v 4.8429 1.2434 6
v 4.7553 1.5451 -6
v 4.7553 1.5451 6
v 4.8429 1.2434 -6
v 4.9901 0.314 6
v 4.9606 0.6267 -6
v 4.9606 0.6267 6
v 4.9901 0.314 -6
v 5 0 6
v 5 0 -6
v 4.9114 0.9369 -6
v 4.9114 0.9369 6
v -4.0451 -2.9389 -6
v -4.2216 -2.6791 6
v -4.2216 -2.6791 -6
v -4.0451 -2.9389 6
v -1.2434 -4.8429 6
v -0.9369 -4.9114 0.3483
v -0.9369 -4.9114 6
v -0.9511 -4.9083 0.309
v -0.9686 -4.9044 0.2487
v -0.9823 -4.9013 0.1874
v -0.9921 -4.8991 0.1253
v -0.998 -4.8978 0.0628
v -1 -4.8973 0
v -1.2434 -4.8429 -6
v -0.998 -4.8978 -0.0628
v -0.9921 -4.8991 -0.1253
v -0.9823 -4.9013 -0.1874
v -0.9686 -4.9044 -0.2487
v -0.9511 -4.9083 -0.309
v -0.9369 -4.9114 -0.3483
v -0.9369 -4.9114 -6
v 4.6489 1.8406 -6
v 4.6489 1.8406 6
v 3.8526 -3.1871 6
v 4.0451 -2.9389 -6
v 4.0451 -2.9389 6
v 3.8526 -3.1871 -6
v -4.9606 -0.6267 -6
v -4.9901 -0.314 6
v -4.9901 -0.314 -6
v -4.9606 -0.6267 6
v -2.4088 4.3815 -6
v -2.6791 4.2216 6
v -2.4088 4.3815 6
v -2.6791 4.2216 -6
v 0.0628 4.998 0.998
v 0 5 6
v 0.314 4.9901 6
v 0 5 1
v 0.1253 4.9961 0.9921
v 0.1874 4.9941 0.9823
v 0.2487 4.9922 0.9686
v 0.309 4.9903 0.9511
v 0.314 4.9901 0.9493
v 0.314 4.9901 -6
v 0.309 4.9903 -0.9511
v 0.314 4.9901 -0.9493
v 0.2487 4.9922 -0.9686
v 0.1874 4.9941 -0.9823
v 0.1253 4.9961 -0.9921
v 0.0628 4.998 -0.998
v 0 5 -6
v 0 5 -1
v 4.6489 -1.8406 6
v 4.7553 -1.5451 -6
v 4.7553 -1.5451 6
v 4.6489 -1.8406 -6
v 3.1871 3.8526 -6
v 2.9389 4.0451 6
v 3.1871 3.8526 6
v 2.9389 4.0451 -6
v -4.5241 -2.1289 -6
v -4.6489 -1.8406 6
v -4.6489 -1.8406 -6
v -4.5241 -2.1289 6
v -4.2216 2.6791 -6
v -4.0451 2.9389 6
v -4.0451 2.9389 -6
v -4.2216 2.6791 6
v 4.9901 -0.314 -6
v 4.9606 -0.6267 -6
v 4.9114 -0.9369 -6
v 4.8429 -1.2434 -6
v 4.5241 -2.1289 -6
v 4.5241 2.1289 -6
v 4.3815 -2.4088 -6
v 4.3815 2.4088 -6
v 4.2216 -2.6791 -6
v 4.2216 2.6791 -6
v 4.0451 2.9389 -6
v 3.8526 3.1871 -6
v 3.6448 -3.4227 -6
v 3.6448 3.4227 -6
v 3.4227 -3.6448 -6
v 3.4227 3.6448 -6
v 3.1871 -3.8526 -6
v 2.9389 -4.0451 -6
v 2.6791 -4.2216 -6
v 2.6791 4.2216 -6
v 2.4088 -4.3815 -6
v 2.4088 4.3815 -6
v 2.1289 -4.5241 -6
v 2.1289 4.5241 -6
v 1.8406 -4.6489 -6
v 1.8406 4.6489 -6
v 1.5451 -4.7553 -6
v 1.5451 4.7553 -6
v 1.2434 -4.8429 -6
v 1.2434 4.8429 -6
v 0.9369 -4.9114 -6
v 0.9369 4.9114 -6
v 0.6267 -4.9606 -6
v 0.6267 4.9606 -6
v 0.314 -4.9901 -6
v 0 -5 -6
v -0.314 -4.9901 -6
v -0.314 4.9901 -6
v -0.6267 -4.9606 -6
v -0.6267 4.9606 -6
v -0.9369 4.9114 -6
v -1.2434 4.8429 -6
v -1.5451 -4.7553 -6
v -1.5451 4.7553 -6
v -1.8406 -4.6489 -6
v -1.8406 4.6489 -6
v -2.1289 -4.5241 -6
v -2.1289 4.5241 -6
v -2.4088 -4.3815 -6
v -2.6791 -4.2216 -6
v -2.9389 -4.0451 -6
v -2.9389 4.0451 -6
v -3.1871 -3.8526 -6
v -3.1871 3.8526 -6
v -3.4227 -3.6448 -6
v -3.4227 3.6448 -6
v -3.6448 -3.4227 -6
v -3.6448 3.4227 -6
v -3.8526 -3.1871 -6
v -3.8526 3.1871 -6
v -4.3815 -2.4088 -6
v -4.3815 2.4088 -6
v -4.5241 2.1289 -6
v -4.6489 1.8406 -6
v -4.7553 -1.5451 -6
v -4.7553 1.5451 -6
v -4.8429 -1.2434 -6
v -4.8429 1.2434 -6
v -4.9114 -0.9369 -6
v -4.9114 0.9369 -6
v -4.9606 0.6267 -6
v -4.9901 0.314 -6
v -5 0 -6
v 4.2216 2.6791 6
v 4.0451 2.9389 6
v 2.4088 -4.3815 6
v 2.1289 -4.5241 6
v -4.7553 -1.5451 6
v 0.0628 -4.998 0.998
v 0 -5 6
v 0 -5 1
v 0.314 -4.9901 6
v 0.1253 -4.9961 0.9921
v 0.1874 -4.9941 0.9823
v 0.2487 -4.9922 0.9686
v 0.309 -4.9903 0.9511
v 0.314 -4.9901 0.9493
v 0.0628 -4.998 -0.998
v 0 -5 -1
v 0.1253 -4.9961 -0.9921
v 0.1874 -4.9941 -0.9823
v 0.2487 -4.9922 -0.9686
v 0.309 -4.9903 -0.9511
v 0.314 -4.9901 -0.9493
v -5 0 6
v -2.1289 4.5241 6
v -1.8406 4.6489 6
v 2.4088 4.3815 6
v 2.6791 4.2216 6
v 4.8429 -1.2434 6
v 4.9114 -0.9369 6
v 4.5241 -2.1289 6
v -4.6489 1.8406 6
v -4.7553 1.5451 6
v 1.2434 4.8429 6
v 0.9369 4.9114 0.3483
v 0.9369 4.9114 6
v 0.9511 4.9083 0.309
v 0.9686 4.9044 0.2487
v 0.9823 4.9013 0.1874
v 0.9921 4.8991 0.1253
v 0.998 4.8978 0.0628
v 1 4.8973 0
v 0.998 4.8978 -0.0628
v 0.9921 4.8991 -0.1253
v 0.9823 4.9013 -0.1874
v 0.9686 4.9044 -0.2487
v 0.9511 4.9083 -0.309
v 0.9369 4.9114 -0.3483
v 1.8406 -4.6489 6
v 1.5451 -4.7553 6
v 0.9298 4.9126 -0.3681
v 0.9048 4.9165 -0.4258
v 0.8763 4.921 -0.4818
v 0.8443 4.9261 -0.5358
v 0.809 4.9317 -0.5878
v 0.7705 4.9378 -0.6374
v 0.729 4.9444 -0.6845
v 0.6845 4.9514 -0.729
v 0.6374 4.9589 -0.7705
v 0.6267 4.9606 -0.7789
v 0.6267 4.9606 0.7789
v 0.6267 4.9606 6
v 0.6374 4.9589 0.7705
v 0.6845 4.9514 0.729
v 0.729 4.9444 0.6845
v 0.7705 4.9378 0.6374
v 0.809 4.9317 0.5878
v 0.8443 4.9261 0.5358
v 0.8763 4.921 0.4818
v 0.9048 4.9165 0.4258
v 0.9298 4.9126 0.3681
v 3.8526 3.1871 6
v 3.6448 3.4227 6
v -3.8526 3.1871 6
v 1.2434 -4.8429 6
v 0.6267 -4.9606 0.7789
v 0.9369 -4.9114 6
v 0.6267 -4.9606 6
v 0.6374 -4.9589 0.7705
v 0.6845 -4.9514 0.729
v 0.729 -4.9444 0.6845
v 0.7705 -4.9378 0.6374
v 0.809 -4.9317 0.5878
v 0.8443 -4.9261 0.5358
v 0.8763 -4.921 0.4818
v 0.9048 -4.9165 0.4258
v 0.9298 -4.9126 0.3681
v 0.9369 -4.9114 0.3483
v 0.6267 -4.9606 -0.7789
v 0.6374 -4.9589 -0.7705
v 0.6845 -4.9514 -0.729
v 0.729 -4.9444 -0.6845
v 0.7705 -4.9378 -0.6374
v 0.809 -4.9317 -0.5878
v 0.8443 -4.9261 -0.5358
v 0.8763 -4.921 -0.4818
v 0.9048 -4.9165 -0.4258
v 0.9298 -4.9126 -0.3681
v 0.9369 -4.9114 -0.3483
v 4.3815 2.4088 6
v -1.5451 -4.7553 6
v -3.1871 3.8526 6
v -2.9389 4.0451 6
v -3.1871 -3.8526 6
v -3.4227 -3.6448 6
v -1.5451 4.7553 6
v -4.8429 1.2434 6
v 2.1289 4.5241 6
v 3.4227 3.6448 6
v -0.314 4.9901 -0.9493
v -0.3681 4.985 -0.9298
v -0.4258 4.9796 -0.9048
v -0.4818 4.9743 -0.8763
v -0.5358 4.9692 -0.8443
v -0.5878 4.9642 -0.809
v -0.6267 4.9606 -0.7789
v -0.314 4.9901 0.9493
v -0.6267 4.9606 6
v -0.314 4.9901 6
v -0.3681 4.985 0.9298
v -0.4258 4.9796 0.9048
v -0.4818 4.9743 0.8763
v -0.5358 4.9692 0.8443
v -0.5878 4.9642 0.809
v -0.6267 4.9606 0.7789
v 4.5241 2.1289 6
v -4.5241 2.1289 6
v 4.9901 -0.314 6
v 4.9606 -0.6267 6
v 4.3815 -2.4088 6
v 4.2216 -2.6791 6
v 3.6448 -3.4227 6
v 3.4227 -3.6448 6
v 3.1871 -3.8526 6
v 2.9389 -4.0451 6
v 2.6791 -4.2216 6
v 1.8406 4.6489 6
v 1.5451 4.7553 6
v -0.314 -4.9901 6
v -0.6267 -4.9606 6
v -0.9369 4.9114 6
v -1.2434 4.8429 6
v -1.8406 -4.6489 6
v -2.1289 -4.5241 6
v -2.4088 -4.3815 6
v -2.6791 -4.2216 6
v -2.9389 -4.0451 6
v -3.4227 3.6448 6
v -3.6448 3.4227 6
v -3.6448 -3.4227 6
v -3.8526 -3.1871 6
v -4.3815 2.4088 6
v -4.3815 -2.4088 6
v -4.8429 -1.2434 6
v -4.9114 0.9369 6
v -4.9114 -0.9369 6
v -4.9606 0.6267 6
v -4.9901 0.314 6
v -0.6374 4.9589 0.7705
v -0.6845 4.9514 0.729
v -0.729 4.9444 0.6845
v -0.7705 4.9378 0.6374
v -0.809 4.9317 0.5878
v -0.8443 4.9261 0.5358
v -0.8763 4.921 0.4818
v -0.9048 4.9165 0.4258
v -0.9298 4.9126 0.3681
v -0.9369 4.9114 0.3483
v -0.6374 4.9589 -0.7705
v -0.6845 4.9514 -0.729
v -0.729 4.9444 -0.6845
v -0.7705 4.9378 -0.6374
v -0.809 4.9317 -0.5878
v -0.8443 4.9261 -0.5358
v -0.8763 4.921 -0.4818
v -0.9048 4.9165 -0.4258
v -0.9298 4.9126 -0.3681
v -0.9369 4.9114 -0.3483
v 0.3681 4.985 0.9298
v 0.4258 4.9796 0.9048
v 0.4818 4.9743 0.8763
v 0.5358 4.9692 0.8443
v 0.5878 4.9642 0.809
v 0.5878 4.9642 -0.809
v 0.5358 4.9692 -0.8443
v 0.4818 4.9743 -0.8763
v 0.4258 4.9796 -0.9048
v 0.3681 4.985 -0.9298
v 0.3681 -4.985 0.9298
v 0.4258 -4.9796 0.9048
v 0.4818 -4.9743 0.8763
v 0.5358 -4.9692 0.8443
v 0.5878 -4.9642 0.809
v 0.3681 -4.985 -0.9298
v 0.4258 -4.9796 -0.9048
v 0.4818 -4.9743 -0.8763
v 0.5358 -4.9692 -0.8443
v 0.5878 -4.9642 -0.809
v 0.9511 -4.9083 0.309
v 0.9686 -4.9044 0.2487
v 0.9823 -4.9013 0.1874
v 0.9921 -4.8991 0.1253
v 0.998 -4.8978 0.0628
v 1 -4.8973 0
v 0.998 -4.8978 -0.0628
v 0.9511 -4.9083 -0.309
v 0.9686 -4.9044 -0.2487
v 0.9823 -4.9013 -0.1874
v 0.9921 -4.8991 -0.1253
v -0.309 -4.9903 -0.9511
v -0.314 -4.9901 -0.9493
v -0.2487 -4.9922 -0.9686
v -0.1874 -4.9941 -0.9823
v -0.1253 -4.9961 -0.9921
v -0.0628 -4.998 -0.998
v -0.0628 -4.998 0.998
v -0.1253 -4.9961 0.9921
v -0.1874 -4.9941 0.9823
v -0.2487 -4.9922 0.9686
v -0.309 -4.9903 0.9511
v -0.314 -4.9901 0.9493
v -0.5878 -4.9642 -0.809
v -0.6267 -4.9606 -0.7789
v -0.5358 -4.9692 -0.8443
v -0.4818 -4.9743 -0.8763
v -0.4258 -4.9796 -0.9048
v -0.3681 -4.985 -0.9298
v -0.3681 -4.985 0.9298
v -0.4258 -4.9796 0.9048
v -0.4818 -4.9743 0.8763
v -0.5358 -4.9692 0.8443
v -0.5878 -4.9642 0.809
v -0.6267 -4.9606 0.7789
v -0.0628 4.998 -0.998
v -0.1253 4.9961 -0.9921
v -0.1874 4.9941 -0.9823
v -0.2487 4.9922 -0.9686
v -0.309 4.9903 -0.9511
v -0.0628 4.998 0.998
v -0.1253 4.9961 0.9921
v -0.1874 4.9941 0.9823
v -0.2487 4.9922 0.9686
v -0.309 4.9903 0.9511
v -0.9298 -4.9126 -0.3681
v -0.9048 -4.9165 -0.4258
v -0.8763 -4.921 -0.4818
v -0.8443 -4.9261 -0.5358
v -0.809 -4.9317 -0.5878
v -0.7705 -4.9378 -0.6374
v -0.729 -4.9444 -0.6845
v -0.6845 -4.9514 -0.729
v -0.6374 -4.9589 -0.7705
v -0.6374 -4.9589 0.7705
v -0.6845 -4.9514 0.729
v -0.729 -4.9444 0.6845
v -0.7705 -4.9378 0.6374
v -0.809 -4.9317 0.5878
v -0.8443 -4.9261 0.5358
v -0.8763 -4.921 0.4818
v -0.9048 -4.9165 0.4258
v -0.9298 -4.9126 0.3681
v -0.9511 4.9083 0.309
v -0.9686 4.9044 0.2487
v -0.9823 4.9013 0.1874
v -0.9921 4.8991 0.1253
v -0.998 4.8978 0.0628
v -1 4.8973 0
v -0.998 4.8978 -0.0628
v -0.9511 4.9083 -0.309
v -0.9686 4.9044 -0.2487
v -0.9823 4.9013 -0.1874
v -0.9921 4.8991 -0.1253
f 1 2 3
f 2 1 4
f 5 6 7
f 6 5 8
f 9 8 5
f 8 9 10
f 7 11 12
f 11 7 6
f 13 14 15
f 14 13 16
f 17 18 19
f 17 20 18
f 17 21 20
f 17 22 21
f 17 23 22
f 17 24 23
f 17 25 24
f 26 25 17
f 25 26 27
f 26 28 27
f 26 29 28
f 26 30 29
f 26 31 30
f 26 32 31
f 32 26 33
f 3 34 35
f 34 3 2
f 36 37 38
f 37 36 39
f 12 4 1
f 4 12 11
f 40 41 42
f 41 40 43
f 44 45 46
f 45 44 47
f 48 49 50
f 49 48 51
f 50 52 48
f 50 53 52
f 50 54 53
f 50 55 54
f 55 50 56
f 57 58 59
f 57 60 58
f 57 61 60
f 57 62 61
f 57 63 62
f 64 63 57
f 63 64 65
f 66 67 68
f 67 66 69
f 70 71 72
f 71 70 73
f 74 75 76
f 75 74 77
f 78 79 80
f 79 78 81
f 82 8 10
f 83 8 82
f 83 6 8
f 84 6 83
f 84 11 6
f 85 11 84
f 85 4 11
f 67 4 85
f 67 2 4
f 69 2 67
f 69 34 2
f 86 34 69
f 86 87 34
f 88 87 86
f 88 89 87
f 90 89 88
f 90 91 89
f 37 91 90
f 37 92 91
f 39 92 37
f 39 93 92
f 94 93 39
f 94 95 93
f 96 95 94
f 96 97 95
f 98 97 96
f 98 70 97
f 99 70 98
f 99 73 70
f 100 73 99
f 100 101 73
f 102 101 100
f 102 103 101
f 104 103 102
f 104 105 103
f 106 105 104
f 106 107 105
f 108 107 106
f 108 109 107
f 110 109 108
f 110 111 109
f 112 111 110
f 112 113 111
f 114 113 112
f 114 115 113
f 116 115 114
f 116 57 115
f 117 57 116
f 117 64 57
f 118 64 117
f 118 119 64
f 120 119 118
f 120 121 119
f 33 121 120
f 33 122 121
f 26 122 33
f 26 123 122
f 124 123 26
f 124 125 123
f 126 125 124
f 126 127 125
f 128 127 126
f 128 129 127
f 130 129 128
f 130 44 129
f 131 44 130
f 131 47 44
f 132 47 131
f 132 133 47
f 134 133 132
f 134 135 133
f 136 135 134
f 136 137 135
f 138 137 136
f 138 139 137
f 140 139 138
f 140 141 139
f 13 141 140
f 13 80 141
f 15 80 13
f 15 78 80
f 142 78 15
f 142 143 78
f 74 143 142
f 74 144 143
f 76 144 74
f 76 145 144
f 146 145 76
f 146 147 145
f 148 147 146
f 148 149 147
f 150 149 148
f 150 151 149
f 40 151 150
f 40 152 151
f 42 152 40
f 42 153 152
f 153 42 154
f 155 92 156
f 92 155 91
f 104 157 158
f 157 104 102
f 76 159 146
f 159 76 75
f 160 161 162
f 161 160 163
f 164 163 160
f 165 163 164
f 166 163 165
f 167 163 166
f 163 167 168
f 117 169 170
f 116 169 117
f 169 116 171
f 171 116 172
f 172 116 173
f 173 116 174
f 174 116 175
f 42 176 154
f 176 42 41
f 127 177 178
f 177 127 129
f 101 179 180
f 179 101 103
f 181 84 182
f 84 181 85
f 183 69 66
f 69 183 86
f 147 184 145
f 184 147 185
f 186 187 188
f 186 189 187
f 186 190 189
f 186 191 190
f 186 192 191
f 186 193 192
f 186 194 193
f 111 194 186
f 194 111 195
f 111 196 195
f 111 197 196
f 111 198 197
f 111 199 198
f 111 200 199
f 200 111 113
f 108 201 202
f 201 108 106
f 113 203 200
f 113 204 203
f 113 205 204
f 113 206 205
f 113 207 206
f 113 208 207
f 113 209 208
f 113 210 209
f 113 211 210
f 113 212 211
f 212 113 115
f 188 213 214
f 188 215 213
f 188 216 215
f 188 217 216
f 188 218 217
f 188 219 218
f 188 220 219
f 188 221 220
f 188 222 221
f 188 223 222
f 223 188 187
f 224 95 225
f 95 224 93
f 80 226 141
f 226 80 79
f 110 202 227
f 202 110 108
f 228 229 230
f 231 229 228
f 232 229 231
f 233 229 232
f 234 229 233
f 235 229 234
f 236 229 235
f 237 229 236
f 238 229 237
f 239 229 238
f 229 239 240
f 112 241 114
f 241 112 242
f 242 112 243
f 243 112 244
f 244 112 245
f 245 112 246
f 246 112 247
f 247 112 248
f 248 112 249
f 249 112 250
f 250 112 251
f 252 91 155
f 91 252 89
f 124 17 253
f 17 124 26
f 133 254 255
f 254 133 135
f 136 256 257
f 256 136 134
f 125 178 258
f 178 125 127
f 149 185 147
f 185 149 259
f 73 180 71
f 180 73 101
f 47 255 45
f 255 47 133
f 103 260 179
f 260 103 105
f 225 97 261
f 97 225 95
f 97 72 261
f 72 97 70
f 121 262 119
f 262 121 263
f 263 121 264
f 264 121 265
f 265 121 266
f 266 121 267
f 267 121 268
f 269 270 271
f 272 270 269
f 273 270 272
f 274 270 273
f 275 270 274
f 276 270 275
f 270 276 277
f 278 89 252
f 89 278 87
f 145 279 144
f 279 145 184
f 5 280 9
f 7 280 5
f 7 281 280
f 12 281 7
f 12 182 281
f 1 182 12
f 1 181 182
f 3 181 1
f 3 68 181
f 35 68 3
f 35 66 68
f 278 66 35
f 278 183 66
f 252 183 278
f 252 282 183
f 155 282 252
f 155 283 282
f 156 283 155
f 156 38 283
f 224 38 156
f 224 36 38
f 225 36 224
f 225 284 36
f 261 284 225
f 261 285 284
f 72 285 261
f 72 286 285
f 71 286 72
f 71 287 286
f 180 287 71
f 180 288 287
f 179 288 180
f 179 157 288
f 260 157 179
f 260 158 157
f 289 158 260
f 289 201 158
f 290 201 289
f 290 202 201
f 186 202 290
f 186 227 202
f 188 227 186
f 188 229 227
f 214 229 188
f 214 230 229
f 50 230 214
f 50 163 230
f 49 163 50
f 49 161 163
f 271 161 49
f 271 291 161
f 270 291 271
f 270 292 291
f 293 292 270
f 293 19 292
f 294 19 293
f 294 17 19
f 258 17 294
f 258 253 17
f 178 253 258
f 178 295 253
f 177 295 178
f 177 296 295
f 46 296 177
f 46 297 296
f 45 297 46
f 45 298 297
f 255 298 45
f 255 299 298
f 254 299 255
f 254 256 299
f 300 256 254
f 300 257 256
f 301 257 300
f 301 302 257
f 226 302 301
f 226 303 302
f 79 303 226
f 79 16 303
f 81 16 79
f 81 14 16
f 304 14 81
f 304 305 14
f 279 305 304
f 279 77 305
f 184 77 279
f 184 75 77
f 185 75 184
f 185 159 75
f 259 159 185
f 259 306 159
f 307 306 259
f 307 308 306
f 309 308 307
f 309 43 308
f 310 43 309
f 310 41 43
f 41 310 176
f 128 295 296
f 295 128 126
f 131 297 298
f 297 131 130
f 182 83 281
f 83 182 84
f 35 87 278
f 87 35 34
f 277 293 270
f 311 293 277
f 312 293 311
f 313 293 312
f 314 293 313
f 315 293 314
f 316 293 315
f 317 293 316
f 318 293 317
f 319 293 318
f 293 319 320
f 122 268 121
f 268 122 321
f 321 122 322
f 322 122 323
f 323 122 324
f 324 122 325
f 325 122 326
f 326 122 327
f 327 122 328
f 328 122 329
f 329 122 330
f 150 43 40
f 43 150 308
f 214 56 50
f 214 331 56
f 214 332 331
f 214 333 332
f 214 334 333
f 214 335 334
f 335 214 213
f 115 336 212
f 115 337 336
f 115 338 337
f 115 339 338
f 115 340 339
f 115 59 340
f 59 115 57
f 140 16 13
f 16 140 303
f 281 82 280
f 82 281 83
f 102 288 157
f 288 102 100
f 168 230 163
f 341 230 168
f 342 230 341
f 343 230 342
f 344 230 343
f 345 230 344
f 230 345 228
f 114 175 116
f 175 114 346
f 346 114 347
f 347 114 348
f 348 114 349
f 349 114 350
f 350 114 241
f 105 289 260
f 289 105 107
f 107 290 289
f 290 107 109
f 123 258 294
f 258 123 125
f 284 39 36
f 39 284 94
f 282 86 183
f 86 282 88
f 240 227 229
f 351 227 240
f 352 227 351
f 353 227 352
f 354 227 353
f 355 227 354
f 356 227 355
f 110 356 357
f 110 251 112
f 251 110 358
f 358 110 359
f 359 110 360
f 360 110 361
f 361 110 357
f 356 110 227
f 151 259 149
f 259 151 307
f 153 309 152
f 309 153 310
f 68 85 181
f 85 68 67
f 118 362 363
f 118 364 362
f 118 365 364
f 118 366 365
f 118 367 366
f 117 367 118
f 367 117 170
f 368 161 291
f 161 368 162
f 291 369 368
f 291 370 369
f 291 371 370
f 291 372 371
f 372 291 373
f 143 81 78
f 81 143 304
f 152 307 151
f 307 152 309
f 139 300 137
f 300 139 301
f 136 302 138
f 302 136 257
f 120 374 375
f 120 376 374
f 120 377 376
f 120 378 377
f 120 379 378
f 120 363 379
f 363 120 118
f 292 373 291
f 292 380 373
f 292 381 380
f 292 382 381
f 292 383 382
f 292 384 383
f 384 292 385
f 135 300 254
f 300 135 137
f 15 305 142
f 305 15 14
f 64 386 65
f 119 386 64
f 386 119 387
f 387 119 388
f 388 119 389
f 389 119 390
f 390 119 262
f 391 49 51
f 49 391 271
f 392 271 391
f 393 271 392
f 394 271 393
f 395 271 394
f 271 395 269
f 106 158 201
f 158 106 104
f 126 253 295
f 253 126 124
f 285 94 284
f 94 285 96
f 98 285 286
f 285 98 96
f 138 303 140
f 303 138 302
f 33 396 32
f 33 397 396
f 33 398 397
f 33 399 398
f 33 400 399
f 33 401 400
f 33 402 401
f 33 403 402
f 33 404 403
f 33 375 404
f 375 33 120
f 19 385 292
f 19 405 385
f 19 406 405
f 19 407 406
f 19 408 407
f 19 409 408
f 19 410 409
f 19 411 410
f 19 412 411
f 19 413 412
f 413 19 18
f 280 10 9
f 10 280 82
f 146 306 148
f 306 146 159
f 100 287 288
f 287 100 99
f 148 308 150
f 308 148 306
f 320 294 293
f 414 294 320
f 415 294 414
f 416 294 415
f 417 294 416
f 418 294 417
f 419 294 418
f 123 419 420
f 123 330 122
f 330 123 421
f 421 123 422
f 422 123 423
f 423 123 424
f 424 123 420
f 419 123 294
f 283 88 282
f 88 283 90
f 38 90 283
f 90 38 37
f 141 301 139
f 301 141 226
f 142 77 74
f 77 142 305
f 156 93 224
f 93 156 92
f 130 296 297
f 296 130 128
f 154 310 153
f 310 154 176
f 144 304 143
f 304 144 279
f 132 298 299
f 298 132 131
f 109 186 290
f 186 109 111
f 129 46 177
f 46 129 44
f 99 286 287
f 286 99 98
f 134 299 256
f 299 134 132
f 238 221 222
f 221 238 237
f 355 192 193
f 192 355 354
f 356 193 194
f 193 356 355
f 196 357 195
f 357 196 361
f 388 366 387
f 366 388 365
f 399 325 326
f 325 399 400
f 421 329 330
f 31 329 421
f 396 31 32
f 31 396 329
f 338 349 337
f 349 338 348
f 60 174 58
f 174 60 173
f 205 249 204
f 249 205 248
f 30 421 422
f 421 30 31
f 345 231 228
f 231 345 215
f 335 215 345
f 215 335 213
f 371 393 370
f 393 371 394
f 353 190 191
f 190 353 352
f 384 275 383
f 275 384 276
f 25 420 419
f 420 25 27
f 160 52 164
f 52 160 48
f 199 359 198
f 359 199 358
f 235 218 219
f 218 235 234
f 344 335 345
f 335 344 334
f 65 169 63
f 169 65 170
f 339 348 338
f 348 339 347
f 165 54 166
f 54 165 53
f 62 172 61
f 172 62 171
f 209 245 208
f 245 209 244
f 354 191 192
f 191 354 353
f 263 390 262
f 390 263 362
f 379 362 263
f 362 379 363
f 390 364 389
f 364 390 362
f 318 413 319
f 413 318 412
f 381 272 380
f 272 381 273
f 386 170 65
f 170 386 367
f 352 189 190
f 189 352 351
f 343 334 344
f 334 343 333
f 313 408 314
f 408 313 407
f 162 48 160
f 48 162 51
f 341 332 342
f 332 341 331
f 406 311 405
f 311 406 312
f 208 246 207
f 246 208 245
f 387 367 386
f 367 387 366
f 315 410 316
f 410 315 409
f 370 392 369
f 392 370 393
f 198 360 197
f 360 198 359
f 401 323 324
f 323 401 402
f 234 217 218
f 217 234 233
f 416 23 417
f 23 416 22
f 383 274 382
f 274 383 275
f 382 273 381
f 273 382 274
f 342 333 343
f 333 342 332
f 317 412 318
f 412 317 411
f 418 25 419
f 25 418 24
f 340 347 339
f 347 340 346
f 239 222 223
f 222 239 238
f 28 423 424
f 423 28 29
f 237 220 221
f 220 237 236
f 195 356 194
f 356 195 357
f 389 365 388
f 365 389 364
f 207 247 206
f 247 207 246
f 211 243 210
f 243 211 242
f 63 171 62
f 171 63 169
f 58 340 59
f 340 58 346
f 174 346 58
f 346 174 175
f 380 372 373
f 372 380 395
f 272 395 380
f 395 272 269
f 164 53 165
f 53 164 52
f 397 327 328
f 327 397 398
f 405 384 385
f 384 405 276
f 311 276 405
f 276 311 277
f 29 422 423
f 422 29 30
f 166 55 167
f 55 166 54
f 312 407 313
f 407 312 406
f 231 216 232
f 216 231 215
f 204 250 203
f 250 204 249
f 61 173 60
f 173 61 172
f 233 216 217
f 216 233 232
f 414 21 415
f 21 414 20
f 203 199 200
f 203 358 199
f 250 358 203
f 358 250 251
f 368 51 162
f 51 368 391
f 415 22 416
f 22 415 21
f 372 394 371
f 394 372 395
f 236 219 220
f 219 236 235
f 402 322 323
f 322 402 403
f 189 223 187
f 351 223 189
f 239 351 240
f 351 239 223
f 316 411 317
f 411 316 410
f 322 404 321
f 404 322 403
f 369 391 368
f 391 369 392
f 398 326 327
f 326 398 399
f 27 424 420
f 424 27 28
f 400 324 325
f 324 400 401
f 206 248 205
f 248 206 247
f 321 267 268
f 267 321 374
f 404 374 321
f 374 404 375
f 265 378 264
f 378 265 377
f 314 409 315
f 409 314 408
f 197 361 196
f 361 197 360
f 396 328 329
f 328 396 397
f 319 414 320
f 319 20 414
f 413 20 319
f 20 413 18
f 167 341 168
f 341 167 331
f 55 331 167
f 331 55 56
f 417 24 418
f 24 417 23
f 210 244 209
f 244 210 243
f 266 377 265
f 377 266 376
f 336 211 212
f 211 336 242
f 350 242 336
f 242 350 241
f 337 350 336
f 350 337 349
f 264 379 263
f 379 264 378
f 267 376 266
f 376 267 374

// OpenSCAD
// Unit of length: Unit.MM
difference()
{
   cylinder(h = 12.0, d = 10.0, center = true, $fn = 100);
   rotate(a = [90.0, 0.0, 0.0])
   {
      cylinder(h = 15.0, d = 2.0, center = true, $fn = 100);
   }
   %union()
   {
      rotate(a = [0.0, 90.0, 0.0])
      {
         cylinder(h = 15.0, d = 6.0, center = true, $fn = 100);
      }
   }
}
